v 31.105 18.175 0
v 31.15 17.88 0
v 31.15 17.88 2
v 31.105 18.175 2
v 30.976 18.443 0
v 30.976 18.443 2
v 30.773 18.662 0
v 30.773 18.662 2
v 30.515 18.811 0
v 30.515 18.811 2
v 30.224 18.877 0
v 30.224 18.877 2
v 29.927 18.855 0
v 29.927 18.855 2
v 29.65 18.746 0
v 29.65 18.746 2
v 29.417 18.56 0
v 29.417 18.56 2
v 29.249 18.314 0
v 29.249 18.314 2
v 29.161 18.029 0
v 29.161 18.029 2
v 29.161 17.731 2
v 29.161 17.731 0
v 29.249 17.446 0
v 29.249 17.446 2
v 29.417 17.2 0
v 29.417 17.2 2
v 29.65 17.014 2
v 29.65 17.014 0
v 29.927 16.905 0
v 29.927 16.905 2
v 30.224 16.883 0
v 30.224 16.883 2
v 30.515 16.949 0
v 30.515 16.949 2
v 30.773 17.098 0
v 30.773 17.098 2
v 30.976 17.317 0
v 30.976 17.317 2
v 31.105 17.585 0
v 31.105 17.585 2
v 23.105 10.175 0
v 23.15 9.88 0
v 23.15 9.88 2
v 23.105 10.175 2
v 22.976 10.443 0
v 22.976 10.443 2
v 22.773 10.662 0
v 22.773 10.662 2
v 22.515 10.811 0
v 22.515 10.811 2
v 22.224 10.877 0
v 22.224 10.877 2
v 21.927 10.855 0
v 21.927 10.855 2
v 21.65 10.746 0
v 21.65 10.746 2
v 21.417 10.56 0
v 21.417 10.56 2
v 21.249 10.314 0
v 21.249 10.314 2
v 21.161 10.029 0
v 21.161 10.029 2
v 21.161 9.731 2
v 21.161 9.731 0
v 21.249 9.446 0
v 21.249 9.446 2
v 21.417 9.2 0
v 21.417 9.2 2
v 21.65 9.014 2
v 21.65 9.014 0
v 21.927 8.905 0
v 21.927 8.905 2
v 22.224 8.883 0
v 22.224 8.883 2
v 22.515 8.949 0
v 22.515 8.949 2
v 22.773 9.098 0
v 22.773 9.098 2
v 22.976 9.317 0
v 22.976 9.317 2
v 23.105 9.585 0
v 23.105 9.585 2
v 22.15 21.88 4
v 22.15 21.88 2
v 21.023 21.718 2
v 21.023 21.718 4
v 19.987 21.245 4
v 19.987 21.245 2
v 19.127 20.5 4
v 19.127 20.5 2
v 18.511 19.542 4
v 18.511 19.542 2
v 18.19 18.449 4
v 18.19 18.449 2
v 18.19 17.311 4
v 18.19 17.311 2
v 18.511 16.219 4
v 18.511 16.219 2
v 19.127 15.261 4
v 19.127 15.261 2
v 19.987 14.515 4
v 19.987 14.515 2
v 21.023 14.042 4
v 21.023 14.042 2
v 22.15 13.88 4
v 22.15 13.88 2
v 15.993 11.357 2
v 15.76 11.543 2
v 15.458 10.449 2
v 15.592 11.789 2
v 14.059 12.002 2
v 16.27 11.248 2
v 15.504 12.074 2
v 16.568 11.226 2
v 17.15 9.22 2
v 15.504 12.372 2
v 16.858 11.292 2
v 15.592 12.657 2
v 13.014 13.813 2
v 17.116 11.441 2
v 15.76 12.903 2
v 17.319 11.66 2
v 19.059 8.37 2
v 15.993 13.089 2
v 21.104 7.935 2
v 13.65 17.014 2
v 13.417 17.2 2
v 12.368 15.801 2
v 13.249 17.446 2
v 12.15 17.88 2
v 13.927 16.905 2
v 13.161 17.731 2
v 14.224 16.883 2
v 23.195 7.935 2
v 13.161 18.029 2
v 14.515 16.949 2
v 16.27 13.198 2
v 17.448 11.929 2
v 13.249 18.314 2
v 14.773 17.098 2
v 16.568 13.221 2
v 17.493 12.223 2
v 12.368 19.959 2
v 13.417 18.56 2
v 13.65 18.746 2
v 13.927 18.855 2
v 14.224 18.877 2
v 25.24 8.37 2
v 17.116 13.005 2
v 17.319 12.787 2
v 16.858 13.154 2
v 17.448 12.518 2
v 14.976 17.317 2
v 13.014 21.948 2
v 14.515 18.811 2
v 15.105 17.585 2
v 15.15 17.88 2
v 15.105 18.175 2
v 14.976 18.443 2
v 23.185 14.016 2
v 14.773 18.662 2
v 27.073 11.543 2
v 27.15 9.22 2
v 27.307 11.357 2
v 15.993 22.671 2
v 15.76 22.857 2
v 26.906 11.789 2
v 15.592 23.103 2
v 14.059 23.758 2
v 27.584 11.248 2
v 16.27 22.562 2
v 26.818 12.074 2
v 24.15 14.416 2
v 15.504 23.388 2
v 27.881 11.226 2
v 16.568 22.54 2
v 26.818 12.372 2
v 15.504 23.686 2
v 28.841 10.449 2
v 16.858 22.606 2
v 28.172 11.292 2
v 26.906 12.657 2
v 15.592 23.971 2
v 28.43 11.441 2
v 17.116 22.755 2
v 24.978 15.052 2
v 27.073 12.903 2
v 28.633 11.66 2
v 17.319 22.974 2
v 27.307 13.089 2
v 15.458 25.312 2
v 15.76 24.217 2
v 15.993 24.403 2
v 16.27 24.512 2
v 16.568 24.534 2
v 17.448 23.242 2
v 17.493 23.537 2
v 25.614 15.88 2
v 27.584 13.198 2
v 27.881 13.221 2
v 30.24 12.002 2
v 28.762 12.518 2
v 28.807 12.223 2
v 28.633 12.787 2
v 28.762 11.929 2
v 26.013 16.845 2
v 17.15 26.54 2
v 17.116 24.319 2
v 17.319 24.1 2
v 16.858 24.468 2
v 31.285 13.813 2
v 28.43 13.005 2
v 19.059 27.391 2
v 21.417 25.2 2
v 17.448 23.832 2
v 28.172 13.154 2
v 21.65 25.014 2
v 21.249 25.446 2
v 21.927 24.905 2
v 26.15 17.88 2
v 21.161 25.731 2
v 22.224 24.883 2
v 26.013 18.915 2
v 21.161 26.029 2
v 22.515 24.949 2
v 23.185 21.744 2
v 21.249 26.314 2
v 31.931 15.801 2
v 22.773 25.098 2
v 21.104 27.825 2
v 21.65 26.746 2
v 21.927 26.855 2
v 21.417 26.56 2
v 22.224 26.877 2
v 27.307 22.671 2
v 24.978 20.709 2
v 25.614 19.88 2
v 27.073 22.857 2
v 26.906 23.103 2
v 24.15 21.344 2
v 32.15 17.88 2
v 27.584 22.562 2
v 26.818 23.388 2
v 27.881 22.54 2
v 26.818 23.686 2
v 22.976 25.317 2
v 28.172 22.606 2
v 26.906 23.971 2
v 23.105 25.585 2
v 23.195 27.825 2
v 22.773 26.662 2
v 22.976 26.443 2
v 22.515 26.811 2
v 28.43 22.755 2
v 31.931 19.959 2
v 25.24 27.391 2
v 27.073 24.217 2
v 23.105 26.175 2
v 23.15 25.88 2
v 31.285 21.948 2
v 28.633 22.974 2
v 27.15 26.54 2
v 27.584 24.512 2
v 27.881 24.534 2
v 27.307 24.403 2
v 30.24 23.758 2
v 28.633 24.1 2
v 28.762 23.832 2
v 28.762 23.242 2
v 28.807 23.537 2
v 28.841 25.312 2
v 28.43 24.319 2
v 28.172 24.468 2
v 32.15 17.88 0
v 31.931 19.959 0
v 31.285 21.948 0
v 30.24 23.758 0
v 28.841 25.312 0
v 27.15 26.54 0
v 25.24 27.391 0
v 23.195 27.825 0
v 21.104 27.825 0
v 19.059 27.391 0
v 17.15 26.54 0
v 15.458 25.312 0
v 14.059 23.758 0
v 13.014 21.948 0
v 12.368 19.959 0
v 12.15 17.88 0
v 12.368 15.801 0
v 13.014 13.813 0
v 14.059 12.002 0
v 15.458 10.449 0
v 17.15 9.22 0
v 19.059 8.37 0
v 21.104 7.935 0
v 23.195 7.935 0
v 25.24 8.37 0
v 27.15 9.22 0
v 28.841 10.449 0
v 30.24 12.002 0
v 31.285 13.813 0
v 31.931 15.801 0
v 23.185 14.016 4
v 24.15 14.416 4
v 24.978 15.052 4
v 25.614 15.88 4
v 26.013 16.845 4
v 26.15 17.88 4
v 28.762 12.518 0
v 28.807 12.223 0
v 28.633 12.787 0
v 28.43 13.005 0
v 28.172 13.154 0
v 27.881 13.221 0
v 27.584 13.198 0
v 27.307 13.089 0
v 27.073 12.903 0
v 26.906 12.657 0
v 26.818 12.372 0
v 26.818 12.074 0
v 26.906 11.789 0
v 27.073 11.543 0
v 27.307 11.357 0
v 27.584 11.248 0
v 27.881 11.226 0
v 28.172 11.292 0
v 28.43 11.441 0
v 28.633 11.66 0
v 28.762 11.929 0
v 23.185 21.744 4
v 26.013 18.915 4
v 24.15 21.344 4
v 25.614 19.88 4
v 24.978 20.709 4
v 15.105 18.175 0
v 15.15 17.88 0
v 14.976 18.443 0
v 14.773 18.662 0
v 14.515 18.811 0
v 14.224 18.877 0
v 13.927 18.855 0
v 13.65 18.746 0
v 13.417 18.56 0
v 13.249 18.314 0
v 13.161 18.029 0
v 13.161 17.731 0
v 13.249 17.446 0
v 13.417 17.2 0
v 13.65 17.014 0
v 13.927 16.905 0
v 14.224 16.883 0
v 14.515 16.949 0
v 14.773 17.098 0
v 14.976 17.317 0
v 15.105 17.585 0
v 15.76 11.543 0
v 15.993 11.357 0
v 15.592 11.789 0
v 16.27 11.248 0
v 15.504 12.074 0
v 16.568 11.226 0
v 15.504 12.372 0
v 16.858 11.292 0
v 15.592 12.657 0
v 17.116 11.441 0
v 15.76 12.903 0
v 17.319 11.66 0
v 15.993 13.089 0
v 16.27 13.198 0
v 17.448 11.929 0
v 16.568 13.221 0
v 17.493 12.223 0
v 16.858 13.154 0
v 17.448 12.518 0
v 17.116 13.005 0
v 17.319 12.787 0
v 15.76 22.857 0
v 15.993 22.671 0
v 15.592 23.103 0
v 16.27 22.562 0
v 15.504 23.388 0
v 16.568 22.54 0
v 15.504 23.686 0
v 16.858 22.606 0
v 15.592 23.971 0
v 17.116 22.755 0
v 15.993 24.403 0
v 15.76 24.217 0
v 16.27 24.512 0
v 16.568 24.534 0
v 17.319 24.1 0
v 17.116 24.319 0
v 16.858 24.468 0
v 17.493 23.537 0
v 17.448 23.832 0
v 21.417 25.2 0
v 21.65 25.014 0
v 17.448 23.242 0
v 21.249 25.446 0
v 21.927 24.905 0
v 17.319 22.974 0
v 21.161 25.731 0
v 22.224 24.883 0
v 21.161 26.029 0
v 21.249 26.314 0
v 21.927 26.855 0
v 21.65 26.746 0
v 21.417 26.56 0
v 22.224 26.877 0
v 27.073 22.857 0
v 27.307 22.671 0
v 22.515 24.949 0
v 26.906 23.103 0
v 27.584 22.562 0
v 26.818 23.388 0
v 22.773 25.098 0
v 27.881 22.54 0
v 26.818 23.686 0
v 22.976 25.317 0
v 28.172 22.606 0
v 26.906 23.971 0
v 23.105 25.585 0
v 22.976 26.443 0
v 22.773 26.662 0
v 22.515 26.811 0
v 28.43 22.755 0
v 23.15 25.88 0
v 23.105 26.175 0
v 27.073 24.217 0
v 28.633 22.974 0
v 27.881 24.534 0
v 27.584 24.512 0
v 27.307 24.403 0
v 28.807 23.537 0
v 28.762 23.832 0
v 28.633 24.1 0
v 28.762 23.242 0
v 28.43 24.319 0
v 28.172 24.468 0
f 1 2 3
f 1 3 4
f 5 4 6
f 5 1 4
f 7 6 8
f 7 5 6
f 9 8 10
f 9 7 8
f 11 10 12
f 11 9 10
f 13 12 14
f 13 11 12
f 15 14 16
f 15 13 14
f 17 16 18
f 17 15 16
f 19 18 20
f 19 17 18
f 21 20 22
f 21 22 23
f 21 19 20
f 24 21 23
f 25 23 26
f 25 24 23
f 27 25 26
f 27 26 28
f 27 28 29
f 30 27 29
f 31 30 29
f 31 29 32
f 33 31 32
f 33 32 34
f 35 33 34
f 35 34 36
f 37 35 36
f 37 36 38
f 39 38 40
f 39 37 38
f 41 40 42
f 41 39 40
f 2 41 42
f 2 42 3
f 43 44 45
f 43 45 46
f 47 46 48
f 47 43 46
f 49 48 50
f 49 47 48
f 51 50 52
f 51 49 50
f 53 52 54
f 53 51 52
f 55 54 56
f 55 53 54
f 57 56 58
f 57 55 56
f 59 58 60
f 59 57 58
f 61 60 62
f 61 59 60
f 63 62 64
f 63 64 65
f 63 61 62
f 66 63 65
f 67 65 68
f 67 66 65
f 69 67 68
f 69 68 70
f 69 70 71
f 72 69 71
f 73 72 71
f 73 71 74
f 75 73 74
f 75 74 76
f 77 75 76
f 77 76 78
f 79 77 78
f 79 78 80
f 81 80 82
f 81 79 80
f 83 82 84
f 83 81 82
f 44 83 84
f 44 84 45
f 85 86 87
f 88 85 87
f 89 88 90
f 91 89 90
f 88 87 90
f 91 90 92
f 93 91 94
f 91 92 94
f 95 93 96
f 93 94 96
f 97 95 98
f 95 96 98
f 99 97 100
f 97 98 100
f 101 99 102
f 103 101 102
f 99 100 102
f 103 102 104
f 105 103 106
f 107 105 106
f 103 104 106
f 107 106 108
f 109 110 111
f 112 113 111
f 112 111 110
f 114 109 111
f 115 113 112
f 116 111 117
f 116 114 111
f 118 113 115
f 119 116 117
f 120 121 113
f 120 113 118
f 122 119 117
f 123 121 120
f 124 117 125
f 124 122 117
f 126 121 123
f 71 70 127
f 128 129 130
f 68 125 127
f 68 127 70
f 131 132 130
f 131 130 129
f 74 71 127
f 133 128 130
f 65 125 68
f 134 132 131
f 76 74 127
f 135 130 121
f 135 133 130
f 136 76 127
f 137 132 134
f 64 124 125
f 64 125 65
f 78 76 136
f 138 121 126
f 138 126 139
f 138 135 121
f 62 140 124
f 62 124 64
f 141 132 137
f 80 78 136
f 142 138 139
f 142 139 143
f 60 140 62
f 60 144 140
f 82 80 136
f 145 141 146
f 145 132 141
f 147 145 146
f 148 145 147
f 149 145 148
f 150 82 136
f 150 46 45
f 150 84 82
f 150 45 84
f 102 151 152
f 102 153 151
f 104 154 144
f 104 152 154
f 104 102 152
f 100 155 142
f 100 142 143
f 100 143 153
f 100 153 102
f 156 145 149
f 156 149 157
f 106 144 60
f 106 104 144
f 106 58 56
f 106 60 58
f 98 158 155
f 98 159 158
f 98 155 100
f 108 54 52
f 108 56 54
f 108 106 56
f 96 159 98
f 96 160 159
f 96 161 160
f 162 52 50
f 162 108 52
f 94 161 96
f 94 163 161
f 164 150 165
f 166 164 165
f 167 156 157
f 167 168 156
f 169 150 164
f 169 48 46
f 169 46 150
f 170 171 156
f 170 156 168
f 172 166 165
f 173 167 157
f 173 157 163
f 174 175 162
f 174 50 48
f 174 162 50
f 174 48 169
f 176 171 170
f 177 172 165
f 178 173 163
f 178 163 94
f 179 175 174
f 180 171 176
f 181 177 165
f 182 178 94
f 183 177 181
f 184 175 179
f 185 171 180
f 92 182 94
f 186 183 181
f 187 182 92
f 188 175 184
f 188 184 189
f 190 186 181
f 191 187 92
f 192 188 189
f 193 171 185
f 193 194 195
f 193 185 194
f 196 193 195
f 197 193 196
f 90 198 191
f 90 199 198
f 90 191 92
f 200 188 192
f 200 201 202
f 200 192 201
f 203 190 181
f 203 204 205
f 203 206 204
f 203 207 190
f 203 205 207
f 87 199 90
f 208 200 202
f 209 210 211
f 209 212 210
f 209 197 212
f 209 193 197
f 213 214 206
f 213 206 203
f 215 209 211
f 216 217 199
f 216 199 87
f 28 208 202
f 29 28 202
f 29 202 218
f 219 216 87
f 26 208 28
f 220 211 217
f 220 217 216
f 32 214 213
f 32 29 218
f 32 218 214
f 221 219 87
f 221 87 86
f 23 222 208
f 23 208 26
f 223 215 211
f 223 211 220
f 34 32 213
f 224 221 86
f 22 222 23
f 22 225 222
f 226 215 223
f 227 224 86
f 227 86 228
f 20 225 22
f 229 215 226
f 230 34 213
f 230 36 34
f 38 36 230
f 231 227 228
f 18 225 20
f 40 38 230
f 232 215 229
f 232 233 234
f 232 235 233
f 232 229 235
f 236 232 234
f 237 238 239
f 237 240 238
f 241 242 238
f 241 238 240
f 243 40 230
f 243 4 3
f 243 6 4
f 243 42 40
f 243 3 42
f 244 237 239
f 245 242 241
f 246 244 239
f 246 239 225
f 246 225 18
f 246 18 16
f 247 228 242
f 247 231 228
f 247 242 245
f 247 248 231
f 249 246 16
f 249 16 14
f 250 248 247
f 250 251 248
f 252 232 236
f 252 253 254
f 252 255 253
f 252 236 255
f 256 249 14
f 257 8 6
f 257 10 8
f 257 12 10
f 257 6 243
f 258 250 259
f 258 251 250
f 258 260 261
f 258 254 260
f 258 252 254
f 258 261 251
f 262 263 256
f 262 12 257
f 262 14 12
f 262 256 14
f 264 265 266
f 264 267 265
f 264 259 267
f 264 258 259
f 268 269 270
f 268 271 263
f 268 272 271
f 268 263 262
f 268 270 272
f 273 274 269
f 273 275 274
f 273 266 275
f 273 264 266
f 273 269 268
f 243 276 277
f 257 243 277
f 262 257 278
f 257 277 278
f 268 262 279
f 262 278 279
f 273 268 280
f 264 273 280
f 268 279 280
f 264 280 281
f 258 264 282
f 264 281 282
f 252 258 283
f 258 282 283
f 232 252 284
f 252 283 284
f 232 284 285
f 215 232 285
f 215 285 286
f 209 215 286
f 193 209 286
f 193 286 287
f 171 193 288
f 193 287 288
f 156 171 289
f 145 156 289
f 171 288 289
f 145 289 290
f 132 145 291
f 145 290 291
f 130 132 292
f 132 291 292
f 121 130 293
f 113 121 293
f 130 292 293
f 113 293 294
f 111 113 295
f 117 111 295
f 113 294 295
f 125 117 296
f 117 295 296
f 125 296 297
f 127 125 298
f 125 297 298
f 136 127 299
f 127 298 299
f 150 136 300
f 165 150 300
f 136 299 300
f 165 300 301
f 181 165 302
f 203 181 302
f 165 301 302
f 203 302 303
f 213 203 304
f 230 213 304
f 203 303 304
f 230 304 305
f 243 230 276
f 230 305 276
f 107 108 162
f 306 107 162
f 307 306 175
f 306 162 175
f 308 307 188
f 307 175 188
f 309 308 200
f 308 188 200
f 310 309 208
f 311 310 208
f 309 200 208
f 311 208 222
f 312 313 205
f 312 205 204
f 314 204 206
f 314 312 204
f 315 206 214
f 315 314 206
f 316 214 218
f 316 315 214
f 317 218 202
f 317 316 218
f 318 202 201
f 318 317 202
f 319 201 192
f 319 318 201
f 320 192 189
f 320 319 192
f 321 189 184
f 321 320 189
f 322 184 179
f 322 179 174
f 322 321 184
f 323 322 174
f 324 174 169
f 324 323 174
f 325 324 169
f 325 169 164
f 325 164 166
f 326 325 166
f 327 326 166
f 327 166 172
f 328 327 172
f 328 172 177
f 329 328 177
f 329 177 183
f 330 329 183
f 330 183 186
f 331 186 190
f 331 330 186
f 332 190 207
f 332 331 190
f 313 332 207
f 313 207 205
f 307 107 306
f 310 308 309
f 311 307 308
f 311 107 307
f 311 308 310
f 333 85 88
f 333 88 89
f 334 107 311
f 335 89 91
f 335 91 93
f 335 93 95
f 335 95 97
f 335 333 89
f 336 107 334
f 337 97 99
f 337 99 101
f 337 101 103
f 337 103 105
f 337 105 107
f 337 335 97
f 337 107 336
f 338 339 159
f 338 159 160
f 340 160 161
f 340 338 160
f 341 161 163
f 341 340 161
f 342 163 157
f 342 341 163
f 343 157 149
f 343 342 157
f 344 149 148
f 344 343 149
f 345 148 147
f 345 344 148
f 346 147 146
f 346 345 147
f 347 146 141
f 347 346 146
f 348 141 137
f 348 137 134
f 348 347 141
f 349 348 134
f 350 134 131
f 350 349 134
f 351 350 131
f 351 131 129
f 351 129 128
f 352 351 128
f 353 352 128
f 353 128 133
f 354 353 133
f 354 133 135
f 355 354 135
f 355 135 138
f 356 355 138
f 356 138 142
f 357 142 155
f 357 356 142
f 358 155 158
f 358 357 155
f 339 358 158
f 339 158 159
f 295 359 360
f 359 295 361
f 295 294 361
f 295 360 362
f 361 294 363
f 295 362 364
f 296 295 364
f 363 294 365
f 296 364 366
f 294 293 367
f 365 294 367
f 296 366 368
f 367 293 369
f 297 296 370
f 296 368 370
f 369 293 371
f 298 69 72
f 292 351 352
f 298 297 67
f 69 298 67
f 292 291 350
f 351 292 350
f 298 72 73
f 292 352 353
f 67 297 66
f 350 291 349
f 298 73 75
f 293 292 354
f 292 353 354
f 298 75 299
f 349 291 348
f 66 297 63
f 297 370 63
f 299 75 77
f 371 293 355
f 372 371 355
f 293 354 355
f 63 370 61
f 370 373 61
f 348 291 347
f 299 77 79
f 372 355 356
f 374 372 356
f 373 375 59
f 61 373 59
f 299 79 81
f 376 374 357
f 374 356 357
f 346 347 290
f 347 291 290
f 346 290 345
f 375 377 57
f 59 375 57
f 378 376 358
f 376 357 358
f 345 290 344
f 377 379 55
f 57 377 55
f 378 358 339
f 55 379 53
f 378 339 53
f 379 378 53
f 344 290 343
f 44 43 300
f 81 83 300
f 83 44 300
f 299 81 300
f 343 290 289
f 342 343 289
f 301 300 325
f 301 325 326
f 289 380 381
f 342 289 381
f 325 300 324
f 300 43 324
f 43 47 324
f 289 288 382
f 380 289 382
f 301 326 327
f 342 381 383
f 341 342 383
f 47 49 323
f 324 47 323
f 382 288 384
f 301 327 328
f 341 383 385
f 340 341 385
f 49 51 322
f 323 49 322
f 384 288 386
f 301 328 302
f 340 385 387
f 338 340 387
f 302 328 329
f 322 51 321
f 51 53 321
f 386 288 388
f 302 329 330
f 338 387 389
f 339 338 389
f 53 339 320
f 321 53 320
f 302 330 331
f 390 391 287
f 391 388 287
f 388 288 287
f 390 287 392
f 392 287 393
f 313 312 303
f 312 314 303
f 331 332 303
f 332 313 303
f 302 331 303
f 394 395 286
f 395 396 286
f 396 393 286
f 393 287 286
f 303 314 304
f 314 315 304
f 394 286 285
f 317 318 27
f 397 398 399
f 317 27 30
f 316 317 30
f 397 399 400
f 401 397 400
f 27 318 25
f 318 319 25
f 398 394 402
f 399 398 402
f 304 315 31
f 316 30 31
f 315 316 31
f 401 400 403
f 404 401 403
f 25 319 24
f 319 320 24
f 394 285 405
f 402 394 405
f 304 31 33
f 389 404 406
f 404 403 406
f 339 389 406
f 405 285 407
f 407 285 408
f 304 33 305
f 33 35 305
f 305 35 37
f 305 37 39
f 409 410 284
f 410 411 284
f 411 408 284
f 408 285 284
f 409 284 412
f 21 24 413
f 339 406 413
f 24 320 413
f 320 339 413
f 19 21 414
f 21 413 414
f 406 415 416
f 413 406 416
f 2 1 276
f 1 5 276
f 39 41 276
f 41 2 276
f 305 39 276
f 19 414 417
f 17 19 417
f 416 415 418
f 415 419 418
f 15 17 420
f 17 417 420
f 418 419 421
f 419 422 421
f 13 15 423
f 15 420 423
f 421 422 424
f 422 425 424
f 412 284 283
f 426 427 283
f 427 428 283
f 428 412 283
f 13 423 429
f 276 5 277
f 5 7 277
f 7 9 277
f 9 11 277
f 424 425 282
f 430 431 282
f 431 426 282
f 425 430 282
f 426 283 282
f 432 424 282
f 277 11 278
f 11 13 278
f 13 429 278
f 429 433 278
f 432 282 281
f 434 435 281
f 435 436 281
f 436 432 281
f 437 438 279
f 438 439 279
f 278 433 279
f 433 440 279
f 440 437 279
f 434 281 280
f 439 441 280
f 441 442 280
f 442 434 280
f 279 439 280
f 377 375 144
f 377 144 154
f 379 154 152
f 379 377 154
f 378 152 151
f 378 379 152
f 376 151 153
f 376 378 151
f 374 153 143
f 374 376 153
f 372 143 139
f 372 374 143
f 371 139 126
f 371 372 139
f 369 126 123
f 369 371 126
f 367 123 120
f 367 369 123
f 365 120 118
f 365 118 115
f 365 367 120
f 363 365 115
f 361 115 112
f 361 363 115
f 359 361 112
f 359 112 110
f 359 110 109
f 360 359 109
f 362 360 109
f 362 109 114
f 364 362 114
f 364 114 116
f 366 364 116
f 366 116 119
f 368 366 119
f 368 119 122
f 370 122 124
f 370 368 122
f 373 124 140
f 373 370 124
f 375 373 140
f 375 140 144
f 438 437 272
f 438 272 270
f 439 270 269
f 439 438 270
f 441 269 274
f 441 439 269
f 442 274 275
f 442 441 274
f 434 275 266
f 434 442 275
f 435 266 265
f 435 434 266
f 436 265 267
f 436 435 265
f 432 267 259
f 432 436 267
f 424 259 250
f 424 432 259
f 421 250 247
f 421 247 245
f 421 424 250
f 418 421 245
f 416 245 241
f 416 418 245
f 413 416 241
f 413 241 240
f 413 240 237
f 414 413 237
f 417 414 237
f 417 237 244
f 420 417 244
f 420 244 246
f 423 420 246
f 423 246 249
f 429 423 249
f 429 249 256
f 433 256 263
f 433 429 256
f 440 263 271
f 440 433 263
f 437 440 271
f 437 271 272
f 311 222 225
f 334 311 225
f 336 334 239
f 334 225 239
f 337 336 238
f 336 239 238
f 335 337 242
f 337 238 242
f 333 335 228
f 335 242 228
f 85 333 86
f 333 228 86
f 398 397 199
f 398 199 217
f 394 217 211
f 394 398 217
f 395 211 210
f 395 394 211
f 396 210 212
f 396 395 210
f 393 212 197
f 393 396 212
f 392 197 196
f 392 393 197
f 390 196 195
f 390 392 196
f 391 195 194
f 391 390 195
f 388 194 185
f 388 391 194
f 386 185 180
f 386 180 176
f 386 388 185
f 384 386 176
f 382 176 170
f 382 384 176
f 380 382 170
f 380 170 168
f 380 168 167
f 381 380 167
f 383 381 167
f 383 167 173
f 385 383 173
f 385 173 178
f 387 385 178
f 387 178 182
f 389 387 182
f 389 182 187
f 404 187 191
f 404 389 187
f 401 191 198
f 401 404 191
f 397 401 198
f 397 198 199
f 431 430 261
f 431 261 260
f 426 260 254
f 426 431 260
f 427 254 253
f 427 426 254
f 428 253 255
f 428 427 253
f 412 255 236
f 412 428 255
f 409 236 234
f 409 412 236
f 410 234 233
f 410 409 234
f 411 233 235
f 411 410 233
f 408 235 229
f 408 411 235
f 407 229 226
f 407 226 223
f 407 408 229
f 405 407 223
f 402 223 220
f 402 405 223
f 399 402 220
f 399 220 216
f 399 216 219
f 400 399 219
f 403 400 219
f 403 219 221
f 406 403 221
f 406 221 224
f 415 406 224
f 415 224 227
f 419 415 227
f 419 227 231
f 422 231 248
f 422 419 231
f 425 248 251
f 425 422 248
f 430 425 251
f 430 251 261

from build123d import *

# Parameters (mm, degrees)
ESQUISSE2_R        = 10
ESQUISSE2_R_2      = 1
BOSS_EXTRU_1_DEPTH = 2
BOSS_EXTRU_2_DEPTH = 2


with BuildPart() as part:
    # Esquisse2 → Boss.-Extru.1 (new body)
    with BuildSketch(Plane.XY):
        with Locations((22.149661623, 17.880169066)):
            Circle(ESQUISSE2_R)
        with Locations((16.492807374, 23.537023315)):
            Circle(ESQUISSE2_R_2, mode=Mode.SUBTRACT)
        with Locations((22.149661623, 25.880169066)):
            Circle(ESQUISSE2_R_2, mode=Mode.SUBTRACT)
        with Locations((27.806515873, 23.537023315)):
            Circle(ESQUISSE2_R_2, mode=Mode.SUBTRACT)
        with Locations((30.149661623, 17.880169066)):
            Circle(ESQUISSE2_R_2, mode=Mode.SUBTRACT)
        with Locations((27.806515873, 12.223314816)):
            Circle(ESQUISSE2_R_2, mode=Mode.SUBTRACT)
        with Locations((22.149661623, 9.880169066)):
            Circle(ESQUISSE2_R_2, mode=Mode.SUBTRACT)
        with Locations((16.492807374, 12.223314816)):
            Circle(ESQUISSE2_R_2, mode=Mode.SUBTRACT)
        with Locations((14.149661623, 17.880169066)):
            Circle(ESQUISSE2_R_2, mode=Mode.SUBTRACT)
    extrude(amount=BOSS_EXTRU_1_DEPTH)

    # Esquisse3 → Boss.-Extru.2 (add)
    with BuildSketch(Plane.XY.offset(2)):
        with BuildLine():
            ThreePointArc((26.149661623, 17.880169066), (24.978088748, 20.70859619), (22.149661623, 21.880169066))
            Line((22.149661623, 21.880169066), (22.149661623, 13.880169066))
            ThreePointArc((22.149661623, 13.880169066), (24.978088748, 15.051741941), (26.149661623, 17.880169066))
        make_face()
        with BuildLine():
            Line((22.149661623, 13.880169066), (22.149661623, 21.880169066))
            ThreePointArc((22.149661623, 21.880169066), (18.149661623, 17.880169066), (22.149661623, 13.880169066))
        make_face()
    extrude(amount=BOSS_EXTRU_2_DEPTH)


solid = part.part
